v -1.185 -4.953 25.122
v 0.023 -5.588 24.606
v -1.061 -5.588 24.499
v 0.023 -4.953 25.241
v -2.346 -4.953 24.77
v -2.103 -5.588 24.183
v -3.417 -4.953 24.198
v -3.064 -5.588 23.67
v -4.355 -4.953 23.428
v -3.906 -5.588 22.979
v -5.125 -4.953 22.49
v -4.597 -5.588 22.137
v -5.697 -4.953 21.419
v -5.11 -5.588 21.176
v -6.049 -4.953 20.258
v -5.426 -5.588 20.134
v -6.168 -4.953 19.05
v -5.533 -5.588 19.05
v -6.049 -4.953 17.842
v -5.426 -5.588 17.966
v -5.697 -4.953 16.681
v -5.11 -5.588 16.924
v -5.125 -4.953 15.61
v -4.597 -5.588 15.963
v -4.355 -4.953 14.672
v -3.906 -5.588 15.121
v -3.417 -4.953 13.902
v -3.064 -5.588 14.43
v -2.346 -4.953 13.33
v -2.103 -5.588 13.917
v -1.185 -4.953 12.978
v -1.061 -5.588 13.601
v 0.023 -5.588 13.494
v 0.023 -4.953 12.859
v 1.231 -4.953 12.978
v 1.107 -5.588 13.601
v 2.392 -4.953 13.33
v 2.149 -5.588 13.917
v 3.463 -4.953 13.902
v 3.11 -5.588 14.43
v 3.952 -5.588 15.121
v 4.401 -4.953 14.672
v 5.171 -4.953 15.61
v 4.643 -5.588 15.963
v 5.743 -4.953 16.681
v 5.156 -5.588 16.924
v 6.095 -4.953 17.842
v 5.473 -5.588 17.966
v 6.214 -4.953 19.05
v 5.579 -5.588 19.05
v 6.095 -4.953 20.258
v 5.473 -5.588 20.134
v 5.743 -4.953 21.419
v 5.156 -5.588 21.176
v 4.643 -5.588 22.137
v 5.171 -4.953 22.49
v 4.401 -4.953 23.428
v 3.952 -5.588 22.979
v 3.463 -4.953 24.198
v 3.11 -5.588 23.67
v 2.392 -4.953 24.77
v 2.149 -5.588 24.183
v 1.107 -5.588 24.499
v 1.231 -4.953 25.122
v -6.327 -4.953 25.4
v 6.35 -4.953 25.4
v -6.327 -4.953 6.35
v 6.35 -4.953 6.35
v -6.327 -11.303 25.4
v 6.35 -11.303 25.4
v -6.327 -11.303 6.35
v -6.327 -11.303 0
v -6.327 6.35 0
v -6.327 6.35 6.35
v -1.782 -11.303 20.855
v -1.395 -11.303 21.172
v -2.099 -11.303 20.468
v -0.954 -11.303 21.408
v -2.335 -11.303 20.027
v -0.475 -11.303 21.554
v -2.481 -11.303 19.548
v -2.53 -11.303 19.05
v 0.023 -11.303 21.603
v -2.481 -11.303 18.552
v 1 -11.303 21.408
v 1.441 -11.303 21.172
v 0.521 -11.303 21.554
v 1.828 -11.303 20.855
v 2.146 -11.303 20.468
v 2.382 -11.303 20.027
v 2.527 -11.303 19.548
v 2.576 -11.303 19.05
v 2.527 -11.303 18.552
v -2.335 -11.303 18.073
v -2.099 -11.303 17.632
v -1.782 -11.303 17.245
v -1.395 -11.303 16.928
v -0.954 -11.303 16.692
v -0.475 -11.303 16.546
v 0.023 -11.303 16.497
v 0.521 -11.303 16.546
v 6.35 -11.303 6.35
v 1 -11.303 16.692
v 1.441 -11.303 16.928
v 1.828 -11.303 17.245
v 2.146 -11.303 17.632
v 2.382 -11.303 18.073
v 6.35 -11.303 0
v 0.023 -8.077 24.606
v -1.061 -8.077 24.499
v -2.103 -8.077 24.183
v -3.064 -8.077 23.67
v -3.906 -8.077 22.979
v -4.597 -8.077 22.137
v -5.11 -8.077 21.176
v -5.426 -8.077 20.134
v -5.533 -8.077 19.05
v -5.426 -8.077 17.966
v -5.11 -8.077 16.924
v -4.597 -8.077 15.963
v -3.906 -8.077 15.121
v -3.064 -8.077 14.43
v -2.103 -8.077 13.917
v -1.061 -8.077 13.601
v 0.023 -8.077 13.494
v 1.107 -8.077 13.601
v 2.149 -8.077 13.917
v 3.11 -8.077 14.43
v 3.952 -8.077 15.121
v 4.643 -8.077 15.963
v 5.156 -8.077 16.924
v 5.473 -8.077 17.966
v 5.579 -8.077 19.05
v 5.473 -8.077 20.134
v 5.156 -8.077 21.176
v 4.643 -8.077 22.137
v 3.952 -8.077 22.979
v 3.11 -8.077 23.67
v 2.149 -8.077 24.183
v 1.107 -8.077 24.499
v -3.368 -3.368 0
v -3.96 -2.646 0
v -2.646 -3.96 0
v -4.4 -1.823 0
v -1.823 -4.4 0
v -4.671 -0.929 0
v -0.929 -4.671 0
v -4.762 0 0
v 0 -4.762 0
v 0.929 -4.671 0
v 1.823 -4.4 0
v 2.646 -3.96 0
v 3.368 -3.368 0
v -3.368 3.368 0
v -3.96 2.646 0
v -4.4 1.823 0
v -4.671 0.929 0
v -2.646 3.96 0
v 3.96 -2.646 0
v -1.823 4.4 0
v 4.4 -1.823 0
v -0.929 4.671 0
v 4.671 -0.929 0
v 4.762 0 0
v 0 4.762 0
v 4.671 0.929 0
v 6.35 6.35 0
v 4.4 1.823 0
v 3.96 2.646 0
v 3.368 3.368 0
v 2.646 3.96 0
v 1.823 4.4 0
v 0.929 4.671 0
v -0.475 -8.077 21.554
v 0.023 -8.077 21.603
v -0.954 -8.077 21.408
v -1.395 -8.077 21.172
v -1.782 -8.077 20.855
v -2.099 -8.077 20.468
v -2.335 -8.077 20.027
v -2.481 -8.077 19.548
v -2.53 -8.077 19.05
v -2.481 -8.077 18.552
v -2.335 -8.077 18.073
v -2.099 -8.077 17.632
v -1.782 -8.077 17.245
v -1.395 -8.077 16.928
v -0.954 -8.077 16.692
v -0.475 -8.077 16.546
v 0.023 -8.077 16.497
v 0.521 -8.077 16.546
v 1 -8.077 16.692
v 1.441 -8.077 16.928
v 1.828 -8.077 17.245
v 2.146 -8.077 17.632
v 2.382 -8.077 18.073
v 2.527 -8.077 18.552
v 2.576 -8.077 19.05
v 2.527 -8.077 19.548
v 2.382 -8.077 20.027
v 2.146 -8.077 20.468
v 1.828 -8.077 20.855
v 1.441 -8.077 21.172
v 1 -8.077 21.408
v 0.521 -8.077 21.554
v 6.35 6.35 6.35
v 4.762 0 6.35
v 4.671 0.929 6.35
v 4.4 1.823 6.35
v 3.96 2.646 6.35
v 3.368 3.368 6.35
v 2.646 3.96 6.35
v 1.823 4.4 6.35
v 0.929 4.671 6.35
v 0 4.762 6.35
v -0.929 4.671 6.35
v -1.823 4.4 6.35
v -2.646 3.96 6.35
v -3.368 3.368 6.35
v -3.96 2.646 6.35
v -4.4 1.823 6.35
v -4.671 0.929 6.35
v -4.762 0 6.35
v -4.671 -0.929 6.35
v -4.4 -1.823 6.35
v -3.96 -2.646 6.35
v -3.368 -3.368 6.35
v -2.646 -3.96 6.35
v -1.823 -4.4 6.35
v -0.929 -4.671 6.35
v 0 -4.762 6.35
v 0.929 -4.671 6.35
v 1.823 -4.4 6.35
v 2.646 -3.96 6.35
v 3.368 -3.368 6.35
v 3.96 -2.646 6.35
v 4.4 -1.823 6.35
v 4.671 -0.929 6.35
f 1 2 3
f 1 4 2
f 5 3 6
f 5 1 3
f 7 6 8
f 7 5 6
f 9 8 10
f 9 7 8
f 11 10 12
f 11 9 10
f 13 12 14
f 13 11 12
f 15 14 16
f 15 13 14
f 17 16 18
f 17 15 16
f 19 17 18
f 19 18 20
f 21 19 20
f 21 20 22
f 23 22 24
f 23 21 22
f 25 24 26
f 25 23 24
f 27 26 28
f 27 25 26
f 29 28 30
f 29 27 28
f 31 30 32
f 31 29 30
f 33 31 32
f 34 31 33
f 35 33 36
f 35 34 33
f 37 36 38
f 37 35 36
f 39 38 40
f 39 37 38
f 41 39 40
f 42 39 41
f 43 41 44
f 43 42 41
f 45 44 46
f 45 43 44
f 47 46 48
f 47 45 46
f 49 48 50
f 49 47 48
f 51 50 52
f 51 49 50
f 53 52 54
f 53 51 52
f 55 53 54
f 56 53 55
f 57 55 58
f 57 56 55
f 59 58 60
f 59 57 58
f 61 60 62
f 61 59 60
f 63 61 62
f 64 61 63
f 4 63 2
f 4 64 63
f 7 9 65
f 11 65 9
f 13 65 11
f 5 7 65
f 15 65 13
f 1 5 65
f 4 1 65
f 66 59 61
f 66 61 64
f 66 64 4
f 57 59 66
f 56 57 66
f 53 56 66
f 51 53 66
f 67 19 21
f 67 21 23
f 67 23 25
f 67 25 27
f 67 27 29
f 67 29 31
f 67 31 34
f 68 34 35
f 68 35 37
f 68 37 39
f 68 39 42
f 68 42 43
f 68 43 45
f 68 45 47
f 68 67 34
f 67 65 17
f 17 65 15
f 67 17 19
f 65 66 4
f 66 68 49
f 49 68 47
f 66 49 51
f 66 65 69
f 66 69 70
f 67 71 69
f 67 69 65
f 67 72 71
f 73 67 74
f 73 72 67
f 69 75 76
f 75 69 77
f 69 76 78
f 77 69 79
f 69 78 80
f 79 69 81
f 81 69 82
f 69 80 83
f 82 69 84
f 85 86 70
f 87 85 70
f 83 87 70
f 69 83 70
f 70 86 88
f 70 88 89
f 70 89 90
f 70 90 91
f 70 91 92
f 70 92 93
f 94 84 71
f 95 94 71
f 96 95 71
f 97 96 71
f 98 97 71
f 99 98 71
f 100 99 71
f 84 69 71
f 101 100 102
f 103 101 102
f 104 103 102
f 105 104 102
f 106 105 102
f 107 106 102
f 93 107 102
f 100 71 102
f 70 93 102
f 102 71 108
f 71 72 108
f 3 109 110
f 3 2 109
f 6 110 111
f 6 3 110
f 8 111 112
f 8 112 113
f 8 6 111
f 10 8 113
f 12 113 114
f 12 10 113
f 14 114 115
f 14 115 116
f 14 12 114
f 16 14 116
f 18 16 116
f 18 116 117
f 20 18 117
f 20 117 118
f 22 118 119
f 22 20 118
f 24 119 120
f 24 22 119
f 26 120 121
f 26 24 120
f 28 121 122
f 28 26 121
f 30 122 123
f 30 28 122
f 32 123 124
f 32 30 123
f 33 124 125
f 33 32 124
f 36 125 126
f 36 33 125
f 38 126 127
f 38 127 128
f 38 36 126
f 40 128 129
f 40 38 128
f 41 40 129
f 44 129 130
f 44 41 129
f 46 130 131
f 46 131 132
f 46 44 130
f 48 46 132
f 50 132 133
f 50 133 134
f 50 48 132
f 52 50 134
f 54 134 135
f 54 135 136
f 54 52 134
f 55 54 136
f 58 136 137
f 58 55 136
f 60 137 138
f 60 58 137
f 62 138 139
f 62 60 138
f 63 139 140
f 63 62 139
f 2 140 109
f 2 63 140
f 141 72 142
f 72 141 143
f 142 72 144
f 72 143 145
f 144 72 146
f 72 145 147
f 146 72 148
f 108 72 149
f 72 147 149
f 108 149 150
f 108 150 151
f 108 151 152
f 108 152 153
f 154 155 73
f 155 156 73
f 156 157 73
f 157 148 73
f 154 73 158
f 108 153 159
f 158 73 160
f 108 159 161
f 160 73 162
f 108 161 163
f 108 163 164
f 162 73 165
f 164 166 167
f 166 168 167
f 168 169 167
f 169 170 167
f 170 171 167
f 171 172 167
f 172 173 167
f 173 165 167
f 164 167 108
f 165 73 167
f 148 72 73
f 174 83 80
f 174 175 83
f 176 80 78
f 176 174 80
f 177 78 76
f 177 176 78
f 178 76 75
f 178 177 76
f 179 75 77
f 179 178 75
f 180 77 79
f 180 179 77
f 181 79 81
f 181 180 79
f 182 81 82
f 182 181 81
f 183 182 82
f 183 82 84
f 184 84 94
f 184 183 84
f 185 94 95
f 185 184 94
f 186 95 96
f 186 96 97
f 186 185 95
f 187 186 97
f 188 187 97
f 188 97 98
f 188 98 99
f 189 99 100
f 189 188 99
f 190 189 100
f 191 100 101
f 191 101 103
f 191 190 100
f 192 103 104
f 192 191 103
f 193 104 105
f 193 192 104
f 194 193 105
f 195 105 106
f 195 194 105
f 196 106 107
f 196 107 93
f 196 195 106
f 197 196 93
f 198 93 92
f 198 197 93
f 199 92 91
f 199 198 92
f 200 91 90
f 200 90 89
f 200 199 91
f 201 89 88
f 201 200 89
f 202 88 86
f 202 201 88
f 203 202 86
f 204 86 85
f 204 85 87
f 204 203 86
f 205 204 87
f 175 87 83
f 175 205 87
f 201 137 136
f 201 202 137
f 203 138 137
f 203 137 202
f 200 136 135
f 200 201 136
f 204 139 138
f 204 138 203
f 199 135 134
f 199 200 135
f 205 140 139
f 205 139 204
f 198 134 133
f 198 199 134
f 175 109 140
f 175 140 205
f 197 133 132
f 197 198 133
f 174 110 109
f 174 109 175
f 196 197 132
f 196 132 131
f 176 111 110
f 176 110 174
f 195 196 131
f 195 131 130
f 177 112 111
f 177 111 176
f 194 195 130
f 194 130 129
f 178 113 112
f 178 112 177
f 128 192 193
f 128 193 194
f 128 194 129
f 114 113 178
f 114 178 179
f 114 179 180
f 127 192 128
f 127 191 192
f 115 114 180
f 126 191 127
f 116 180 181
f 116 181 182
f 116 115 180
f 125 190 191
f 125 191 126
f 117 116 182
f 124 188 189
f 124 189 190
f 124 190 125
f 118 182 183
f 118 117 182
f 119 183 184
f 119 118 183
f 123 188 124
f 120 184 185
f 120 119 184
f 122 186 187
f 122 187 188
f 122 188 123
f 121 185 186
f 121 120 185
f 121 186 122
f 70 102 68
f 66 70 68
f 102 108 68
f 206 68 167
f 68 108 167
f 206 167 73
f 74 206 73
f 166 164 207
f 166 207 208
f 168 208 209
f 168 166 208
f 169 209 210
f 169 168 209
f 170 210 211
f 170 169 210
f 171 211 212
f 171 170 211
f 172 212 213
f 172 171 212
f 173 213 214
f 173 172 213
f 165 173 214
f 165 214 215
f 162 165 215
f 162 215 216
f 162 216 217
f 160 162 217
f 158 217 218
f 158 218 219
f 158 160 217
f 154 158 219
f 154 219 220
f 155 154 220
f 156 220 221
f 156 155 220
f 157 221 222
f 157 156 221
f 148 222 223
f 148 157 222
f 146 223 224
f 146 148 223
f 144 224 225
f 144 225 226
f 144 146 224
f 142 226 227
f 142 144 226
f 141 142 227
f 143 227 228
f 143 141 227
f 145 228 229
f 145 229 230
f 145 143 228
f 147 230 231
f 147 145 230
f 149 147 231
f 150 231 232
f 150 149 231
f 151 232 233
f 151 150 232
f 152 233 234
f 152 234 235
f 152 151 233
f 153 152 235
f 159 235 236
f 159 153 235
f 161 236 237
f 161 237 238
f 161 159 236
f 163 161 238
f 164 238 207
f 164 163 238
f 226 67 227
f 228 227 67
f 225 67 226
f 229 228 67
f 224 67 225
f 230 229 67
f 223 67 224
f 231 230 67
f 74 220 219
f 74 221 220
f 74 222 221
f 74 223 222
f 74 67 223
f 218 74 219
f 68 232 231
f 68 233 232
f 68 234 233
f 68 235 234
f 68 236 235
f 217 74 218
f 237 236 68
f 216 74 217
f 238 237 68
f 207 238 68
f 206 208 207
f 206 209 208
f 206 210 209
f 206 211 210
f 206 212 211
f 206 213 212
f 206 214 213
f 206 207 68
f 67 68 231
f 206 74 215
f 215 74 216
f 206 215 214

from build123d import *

# Parameters (mm, degrees)
SKETCH1_R           = 4.7625
BOSS_EXTRUDE1_DEPTH = 6.35
SKETCH2_W           = 12.676867833
SKETCH2_H           = 6.35
BOSS_EXTRUDE2_DEPTH = 19.05


with BuildPart() as part:
    # Sketch1 → Boss-Extrude1 (new body)
    with BuildSketch(Plane.XY):
        Polygon((-6.326867833, 0), (-6.326867833, -11.303), (6.35, -11.303), (6.35, 0), (6.35, 6.35), (-6.326867833, 6.35), align=None)
        Circle(SKETCH1_R, mode=Mode.SUBTRACT)
    extrude(amount=BOSS_EXTRUDE1_DEPTH)

    # Sketch2 → Boss-Extrude2 (add)
    with BuildSketch(Plane.XY.offset(6.35)):
        with Locations((0.011566083, -8.128)):
            Rectangle(SKETCH2_W, SKETCH2_H)
    extrude(amount=BOSS_EXTRUDE2_DEPTH)

    # Sketch7 → CBORE for #10 Binding Head Machine Screw1 (revolve, cut)
    with BuildSketch(Plane(origin=(0.023132167, -4.953, 19.05), x_dir=(0, 0, 1), z_dir=(1, 0, 0))):
        Polygon((0, 0), (0, 6.35), (2.5527, 6.35), (2.5527, 3.1242), (5.55625, 3.1242), (5.55625, 0.635), (6.19125, 0), align=None)
    revolve(axis=Axis((0.023132167, 1.397, 19.05), (0, -1, 0)), mode=Mode.SUBTRACT)


solid = part.part
